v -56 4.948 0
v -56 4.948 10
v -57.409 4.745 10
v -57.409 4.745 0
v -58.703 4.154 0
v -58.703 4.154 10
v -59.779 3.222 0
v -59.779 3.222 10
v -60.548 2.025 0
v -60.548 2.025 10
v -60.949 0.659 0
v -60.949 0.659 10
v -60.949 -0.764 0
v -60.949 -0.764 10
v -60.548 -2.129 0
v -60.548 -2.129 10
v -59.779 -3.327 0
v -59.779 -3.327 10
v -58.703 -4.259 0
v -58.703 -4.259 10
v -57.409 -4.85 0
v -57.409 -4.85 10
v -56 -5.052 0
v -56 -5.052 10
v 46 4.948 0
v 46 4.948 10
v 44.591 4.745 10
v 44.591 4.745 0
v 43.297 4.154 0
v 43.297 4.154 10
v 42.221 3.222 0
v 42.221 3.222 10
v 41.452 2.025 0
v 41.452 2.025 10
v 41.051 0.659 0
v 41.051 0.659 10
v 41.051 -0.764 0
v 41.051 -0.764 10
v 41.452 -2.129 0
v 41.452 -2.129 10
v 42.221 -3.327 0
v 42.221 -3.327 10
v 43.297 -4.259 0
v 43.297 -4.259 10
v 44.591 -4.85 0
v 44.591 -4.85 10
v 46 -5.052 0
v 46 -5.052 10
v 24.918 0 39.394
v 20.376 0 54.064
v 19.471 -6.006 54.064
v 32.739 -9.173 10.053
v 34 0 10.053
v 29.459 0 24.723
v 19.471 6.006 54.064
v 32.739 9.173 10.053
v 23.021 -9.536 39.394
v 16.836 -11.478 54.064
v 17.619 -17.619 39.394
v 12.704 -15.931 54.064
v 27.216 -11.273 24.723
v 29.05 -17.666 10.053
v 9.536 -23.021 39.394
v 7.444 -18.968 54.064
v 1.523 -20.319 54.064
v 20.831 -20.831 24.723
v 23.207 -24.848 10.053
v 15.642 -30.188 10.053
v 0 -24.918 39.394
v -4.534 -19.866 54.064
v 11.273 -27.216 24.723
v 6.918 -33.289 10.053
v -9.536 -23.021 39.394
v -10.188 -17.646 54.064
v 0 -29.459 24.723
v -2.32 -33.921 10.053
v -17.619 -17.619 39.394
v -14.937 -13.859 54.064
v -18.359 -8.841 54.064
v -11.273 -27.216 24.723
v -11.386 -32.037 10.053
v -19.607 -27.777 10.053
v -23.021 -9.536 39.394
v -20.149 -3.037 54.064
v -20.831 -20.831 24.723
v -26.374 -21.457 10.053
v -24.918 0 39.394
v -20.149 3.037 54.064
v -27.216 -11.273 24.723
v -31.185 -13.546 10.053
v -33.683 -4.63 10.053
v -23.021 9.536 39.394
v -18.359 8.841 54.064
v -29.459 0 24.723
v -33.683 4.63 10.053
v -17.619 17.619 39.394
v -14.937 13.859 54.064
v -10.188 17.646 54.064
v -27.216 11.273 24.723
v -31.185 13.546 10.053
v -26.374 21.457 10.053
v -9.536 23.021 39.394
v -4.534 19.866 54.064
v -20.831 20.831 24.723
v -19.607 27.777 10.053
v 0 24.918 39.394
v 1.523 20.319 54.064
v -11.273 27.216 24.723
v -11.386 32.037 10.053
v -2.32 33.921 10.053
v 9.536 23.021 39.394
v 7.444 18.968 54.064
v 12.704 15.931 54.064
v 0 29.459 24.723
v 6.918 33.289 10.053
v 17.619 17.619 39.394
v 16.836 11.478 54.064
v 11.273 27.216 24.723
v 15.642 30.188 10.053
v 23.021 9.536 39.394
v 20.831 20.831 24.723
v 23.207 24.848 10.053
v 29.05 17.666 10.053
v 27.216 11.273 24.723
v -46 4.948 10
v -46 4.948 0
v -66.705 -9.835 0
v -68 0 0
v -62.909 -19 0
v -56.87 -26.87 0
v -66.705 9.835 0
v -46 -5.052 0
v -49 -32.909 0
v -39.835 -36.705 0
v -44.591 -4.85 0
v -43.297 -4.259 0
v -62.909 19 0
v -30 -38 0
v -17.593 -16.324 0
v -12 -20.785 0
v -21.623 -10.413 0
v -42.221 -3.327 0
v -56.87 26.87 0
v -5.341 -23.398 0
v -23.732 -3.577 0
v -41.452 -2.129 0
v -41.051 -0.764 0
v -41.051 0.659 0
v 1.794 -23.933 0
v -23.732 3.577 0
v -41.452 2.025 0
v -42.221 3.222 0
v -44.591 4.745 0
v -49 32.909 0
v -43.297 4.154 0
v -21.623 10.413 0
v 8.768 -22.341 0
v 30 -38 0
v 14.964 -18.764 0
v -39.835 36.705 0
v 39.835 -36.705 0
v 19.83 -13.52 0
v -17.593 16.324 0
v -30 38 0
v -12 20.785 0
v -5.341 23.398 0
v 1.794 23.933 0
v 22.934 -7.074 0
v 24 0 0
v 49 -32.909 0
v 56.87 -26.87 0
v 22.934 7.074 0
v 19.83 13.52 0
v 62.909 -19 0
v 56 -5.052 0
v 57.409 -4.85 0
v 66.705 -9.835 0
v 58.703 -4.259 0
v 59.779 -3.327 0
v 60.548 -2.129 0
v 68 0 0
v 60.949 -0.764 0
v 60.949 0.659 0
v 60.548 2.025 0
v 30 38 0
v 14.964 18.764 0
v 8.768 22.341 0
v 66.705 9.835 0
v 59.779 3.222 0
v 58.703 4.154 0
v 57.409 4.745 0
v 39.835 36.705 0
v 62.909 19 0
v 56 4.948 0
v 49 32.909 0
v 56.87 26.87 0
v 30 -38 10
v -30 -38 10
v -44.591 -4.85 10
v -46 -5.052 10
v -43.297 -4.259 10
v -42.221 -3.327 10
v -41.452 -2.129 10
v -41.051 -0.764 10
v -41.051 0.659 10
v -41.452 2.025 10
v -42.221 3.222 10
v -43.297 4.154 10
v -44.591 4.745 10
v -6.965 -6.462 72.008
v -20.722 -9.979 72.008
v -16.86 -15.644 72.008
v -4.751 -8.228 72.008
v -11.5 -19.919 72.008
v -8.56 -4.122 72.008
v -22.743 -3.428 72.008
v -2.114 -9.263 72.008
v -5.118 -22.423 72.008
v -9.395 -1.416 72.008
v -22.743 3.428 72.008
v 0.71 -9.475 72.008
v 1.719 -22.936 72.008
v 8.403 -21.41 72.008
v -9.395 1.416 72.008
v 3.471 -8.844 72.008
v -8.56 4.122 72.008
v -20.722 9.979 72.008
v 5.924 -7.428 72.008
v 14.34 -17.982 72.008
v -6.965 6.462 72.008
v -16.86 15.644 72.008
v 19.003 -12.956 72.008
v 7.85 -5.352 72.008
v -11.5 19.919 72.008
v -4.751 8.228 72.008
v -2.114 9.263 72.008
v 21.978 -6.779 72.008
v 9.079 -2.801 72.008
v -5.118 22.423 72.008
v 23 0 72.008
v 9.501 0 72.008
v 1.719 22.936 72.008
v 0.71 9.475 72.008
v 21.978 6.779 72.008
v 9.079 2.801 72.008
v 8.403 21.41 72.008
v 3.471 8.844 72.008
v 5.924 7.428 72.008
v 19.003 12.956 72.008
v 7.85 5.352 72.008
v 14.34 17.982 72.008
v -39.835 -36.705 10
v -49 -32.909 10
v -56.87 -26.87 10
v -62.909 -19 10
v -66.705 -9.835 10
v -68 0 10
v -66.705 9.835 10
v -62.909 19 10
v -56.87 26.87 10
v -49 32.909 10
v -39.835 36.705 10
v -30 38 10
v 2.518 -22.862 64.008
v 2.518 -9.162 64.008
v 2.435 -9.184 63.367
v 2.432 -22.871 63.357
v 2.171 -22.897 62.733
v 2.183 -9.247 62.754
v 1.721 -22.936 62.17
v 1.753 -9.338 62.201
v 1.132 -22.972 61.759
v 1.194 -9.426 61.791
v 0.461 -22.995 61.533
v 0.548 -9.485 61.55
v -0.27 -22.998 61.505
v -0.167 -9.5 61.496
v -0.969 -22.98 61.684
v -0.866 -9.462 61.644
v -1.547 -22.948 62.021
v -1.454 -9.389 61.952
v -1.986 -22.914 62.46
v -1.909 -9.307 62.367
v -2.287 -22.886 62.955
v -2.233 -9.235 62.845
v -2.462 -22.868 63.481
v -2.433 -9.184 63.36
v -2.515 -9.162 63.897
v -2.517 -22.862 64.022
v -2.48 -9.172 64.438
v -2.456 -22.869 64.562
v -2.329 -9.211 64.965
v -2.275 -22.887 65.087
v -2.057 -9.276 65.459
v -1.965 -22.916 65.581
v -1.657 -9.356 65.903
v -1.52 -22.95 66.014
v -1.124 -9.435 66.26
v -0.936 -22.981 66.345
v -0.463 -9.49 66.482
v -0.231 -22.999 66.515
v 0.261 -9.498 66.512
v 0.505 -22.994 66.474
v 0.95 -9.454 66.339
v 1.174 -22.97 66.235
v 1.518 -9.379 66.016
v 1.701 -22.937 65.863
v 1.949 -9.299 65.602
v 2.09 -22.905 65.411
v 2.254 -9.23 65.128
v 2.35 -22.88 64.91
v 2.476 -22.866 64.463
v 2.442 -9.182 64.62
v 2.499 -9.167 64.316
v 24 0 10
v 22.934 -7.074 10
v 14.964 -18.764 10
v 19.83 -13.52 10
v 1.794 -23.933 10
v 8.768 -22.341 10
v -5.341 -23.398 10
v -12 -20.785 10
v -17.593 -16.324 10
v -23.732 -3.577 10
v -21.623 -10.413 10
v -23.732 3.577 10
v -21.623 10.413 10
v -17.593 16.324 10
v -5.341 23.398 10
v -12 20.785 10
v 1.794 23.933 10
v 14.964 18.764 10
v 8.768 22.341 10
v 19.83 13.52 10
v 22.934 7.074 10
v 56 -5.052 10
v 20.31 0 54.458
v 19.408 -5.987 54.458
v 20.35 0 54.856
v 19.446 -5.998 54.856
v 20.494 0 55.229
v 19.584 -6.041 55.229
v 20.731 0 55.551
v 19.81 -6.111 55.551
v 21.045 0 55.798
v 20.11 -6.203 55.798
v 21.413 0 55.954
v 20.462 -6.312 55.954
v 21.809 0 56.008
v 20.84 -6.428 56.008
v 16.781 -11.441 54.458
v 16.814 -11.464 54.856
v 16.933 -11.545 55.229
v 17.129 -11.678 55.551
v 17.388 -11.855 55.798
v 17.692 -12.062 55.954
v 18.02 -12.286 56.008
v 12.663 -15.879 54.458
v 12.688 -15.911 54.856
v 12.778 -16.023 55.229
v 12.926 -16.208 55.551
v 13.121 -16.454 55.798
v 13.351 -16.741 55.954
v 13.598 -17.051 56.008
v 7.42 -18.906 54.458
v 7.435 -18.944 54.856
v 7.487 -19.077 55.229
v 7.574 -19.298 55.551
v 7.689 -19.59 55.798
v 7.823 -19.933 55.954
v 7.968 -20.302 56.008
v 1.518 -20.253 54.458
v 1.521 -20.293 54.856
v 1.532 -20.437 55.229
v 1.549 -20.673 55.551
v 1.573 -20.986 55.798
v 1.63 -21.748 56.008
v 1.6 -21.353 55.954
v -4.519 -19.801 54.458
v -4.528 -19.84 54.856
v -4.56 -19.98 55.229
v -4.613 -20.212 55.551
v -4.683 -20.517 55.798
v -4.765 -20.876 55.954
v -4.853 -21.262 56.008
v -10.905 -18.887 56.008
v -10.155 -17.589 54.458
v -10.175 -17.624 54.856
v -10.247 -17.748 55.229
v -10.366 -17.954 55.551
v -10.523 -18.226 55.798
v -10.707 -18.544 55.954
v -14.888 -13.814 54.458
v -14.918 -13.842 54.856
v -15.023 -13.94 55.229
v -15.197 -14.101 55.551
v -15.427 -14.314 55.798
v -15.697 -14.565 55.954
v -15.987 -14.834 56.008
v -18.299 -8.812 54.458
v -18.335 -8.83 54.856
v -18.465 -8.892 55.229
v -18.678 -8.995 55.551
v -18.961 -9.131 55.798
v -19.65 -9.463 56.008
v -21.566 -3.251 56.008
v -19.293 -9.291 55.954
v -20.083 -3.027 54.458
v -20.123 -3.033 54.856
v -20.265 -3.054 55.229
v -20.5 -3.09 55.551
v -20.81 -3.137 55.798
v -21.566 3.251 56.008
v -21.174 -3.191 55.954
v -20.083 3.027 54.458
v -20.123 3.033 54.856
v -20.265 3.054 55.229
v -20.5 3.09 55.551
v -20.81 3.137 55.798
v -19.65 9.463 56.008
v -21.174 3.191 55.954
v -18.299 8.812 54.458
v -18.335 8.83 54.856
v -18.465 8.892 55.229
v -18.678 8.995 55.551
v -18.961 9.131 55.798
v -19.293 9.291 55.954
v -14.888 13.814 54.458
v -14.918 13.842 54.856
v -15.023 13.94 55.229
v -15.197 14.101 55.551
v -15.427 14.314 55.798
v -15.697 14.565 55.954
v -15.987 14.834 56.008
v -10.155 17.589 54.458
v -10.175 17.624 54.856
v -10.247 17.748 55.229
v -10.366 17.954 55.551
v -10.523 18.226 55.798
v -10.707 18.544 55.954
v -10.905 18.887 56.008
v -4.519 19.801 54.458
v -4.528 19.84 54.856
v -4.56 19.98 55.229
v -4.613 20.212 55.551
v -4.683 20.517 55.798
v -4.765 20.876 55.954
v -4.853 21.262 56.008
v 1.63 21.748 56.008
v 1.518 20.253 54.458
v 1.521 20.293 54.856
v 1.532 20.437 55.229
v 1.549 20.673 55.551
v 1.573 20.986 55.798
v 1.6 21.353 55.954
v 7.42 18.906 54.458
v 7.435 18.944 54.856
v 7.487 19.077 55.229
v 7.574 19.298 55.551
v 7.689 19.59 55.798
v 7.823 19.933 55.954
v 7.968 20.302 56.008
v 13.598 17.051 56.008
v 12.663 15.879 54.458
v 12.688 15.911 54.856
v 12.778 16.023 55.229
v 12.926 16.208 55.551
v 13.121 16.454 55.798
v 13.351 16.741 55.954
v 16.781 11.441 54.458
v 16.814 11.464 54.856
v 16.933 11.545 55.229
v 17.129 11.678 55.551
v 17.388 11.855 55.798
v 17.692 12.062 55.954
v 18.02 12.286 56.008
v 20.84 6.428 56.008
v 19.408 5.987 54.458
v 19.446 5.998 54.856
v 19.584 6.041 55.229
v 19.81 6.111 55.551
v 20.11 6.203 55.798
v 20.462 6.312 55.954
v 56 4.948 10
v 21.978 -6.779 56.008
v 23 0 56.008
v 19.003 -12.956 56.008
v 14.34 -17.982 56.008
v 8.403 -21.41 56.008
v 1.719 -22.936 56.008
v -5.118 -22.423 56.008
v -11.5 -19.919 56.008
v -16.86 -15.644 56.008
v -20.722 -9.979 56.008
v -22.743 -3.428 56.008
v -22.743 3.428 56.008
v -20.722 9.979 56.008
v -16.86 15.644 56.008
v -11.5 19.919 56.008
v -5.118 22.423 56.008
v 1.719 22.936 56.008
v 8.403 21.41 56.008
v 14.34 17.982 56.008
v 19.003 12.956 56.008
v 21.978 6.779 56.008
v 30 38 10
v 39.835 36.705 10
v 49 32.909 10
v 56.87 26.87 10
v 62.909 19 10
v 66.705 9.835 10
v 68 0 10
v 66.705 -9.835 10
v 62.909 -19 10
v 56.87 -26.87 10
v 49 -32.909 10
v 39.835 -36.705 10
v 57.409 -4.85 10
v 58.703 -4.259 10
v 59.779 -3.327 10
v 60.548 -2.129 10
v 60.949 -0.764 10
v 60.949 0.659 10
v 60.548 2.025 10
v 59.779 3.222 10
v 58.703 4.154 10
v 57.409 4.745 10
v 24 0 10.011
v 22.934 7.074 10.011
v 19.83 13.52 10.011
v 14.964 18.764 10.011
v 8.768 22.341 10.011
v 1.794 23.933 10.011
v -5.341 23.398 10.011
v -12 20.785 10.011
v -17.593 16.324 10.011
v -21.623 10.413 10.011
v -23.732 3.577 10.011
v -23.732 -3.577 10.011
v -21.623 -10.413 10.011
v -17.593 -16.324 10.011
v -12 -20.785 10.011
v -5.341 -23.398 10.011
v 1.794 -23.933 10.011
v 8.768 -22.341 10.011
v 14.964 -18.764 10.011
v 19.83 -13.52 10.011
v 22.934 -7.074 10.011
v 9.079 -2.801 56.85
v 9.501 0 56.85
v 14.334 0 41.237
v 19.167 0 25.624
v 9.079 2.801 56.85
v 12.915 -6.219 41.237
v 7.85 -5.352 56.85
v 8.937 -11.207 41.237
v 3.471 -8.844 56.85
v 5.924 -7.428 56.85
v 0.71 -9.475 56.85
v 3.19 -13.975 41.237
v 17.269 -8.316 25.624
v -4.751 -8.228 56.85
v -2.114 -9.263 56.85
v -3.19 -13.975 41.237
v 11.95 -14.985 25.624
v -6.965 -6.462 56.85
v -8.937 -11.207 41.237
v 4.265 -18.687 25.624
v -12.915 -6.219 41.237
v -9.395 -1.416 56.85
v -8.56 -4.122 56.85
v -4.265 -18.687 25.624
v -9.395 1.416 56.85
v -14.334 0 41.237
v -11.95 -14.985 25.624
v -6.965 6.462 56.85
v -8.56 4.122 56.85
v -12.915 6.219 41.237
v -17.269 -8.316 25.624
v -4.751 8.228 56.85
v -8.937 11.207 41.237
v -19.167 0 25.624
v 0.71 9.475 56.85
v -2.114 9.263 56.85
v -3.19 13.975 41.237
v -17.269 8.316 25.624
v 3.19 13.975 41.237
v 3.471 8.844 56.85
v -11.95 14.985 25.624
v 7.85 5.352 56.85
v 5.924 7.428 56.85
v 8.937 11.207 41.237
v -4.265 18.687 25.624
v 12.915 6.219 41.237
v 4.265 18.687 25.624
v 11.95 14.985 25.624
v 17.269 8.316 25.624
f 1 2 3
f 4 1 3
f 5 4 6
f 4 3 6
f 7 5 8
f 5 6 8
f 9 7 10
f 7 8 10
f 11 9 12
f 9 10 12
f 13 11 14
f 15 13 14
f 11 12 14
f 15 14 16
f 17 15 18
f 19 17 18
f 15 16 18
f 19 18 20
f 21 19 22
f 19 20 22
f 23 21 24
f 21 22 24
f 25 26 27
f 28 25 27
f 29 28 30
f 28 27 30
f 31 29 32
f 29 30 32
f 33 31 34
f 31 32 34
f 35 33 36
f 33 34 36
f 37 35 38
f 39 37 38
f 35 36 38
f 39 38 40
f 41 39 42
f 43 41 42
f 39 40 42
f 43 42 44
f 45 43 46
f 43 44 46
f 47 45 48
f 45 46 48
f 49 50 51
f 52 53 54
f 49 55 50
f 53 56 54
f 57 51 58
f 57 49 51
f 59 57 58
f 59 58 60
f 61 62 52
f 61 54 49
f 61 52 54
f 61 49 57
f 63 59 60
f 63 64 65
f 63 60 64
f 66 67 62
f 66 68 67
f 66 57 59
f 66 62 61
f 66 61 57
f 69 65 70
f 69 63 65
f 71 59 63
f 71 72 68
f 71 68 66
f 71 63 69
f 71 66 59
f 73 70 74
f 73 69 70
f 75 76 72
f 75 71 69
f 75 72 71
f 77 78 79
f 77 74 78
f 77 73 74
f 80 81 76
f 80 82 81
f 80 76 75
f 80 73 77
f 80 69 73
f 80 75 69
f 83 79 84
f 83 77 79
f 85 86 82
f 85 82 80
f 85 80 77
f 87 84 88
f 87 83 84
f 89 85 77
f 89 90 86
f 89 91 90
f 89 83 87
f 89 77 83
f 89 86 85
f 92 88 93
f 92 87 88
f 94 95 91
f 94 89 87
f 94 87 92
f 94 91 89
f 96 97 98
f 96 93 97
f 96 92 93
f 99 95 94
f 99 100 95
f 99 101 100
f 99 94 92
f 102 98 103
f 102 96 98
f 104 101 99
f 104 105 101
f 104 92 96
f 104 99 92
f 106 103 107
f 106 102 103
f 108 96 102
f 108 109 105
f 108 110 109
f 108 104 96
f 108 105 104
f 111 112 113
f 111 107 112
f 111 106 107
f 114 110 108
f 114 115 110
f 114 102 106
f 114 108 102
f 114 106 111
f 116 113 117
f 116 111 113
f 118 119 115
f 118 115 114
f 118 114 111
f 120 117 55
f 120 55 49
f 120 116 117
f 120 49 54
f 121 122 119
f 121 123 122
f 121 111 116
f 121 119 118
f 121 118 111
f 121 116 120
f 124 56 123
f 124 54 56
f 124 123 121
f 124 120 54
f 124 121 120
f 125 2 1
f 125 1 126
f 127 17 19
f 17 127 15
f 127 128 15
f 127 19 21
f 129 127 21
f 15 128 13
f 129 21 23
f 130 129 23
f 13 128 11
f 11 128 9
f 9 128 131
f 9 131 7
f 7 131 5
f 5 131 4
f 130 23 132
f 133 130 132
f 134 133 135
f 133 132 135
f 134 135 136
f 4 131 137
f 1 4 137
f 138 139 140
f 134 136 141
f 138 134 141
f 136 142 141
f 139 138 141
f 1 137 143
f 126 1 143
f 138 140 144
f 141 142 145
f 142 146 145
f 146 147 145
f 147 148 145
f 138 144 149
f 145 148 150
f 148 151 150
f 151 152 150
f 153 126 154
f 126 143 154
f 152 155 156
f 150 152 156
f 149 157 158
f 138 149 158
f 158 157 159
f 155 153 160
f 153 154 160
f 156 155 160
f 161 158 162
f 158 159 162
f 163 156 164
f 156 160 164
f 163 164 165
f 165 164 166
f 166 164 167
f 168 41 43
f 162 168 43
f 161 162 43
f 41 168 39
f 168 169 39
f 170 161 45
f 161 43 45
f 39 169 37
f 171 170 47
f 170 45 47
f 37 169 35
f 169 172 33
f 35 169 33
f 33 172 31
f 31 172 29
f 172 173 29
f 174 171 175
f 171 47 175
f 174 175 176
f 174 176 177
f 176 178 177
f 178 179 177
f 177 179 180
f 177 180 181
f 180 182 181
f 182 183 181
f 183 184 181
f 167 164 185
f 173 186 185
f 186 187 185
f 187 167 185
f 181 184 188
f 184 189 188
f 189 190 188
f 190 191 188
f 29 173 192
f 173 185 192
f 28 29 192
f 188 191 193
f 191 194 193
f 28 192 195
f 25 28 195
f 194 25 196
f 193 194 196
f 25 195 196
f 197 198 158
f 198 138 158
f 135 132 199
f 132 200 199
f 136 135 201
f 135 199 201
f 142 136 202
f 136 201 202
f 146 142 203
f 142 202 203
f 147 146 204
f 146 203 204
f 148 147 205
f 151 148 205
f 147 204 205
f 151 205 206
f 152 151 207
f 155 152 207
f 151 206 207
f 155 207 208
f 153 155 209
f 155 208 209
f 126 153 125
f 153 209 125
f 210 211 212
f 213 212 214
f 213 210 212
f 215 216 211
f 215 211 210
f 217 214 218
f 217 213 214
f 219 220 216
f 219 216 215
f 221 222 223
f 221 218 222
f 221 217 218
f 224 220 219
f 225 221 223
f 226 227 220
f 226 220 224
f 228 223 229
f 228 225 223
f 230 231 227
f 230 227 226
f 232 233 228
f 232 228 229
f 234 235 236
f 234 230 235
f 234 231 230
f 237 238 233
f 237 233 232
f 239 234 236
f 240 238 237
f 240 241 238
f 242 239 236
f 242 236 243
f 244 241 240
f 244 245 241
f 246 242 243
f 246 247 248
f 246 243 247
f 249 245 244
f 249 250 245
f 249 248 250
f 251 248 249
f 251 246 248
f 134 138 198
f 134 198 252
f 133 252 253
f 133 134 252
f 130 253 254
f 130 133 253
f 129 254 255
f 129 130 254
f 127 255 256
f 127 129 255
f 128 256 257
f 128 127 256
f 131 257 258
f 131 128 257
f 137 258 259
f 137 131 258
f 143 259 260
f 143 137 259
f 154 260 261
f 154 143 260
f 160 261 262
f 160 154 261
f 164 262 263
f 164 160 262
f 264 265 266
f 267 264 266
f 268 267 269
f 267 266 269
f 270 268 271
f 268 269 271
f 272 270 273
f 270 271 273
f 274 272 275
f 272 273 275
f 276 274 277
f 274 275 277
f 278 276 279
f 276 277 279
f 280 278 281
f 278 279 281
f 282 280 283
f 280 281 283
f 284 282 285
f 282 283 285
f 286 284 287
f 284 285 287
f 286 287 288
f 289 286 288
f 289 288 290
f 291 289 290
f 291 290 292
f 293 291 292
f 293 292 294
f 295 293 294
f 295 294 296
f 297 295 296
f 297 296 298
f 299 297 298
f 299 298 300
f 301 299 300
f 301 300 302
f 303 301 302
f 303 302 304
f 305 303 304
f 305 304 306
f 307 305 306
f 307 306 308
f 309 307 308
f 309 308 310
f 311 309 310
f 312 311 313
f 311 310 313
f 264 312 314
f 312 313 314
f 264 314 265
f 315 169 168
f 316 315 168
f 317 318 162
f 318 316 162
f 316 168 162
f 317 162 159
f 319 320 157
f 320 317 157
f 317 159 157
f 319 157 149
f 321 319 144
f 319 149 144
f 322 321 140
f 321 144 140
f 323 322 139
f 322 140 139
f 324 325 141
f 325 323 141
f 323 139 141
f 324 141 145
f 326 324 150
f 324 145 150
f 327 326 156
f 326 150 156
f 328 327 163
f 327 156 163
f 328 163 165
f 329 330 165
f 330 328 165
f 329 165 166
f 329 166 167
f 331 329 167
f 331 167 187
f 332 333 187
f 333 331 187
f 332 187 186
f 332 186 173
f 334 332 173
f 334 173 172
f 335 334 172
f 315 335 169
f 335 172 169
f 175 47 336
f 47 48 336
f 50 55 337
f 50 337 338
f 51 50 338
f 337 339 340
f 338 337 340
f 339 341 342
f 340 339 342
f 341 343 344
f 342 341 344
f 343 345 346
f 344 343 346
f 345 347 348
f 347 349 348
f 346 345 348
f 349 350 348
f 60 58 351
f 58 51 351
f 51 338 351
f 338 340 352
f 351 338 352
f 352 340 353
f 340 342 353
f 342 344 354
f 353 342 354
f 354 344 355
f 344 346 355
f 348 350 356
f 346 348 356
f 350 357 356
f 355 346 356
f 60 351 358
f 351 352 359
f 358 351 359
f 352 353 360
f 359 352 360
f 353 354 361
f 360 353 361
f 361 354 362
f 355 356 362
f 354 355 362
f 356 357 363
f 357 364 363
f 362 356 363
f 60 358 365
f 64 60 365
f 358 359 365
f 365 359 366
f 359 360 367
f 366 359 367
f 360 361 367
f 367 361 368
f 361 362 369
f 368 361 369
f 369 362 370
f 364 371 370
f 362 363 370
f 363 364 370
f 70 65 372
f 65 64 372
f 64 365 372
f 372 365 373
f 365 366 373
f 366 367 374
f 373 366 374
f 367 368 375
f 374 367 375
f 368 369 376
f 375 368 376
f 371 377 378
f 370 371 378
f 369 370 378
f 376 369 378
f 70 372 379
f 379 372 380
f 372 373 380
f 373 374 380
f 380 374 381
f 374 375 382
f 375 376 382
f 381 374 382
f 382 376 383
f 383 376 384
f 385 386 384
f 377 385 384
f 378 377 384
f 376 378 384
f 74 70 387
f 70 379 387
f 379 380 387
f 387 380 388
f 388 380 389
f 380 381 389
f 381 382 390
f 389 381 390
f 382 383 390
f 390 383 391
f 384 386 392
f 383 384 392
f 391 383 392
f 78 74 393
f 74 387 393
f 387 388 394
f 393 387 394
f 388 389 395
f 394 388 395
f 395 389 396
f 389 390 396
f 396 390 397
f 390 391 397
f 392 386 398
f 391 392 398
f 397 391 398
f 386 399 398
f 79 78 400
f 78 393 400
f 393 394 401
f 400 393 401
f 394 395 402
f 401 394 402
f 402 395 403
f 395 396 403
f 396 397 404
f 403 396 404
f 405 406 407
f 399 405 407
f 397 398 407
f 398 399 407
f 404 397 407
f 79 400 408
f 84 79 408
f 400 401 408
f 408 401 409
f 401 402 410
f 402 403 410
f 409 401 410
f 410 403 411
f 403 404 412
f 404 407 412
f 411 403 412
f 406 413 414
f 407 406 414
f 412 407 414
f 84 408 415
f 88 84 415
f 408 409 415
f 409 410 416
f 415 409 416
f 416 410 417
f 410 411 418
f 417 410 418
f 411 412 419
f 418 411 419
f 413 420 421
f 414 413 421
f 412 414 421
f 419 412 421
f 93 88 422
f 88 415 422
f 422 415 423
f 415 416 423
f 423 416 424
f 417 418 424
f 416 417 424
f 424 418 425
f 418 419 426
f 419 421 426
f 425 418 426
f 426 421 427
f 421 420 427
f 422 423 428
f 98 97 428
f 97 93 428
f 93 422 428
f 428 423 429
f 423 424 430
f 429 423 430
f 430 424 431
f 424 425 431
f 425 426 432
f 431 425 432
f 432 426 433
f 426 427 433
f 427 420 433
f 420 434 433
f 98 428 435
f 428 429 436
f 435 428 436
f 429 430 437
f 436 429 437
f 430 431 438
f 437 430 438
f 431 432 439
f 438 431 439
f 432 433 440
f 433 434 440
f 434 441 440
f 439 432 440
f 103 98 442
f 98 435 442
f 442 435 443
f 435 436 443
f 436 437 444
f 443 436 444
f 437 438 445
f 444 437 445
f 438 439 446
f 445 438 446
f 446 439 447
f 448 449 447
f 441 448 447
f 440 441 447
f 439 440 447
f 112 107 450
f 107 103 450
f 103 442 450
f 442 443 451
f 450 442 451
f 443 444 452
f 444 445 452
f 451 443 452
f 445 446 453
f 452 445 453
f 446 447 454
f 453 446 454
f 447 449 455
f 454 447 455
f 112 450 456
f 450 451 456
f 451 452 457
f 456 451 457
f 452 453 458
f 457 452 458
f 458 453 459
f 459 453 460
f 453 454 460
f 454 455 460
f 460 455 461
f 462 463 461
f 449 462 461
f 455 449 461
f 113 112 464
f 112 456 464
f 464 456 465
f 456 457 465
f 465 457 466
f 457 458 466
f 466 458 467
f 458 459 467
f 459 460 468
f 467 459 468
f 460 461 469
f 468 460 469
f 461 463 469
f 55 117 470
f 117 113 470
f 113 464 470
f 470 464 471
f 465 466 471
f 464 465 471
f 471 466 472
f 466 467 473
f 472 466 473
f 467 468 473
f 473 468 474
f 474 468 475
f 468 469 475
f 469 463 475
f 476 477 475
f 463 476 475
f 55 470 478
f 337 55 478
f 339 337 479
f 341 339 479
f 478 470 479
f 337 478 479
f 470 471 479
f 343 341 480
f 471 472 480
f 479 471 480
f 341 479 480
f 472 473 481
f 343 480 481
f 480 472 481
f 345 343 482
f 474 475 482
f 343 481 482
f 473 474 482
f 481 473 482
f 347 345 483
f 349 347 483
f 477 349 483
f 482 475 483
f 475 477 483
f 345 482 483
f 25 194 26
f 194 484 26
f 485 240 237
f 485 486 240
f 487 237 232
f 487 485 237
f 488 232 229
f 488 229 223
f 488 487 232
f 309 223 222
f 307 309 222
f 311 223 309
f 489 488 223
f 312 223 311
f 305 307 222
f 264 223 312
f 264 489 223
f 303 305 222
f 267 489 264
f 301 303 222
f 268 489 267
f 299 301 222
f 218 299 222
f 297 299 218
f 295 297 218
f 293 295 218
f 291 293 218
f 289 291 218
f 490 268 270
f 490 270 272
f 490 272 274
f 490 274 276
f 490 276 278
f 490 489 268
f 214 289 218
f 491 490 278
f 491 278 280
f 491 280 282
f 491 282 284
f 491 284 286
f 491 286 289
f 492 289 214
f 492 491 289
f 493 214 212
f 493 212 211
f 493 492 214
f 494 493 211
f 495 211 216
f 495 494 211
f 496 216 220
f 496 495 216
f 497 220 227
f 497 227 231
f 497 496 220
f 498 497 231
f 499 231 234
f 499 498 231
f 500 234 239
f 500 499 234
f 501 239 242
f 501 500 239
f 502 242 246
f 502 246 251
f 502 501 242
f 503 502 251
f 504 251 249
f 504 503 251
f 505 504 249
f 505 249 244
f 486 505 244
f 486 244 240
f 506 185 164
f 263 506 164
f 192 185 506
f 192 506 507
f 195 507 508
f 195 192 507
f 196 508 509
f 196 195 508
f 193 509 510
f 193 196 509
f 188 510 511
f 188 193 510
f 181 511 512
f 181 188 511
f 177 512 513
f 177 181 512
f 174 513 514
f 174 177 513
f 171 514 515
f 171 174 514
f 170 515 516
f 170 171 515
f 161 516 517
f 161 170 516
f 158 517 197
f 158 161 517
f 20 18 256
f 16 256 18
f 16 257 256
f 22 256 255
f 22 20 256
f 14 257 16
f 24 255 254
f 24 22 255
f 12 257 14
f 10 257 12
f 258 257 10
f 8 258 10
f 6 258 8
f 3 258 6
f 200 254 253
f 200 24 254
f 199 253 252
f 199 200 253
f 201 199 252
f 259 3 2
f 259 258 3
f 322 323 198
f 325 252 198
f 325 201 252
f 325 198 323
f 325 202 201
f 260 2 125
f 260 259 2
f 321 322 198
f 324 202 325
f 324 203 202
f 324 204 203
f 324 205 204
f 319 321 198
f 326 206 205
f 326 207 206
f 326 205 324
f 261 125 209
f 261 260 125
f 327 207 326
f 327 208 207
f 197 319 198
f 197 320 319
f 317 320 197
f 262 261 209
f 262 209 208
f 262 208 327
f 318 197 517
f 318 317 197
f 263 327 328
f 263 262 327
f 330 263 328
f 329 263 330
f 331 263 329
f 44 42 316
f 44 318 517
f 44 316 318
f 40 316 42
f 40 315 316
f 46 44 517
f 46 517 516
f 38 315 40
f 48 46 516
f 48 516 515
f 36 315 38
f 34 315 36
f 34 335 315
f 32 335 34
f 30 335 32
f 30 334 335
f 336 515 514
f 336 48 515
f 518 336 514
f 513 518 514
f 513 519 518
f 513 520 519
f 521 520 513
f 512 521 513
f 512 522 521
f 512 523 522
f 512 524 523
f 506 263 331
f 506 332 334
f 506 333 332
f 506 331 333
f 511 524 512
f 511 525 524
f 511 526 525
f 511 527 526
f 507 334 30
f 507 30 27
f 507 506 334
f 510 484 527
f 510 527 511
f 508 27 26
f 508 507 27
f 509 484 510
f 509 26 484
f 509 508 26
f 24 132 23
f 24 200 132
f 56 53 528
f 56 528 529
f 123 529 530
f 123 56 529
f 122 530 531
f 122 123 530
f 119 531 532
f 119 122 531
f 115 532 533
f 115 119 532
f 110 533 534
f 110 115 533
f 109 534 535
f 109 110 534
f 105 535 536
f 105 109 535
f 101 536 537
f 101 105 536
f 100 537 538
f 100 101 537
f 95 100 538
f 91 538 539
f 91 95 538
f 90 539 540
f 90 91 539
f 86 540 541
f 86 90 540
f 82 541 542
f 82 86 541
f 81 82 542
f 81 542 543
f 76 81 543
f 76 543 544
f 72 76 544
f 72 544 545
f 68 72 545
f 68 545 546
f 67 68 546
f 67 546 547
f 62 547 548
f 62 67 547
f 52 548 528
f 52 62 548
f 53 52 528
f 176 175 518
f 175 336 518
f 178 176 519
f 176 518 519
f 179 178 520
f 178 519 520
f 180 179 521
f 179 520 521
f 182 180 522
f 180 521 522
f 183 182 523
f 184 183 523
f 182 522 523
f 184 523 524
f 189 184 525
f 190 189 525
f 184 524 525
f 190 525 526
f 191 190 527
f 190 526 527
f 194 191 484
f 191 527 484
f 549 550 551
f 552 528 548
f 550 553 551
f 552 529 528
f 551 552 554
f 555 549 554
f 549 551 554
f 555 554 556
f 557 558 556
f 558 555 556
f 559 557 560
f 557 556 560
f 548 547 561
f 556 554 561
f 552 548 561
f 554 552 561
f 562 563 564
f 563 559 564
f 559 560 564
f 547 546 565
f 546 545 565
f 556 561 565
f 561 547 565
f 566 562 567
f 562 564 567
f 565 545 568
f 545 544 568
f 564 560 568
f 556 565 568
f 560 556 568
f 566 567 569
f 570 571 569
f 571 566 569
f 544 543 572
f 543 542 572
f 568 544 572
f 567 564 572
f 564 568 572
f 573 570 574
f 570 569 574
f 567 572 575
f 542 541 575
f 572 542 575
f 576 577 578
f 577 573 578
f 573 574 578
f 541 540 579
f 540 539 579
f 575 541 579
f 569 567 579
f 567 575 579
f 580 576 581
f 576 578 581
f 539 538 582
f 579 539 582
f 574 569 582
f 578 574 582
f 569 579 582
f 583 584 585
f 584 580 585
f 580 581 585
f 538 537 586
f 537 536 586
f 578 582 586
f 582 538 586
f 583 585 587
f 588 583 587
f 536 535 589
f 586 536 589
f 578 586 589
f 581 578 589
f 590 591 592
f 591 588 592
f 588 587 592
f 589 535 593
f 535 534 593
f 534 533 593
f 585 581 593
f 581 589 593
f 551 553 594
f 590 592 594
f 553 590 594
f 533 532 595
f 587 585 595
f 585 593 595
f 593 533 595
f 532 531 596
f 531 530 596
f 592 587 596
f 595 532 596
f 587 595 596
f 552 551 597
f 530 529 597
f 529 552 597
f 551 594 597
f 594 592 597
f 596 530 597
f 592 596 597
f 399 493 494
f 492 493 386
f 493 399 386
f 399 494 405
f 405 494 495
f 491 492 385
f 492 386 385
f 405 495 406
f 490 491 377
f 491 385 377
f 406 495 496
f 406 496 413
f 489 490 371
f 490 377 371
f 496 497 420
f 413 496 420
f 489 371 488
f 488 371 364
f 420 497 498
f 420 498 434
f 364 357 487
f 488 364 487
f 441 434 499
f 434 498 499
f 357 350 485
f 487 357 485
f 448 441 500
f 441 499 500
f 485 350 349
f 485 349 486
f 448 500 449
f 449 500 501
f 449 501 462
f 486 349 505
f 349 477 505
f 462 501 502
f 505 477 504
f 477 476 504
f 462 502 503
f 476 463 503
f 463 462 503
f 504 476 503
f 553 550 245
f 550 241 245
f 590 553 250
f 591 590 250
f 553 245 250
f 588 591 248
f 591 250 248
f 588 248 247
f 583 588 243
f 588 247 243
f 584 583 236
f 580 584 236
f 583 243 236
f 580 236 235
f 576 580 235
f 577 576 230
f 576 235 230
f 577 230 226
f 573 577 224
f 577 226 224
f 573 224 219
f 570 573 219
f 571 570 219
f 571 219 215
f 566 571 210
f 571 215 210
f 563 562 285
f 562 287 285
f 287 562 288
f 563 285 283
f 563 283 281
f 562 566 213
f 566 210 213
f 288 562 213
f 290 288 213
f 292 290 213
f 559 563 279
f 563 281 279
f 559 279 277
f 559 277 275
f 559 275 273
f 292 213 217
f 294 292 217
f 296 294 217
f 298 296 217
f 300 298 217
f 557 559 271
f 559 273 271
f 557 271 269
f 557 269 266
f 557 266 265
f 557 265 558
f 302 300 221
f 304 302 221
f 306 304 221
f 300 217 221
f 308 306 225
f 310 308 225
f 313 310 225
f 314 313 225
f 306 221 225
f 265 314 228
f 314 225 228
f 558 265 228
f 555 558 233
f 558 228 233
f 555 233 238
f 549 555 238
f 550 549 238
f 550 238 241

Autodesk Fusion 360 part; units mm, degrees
sketch "Sketch1" plane through (0, 0, 0) normal (0, 0, 1) x (1, 0, 0)
  circle A0 centre (0, 0) radius 24
  line L0 (30, 38) -> (-30, 38)
  arc A1 (-30, 38) -> (-30, -38) centre (-30, 0) ccw
  line L1 (-30, -38) -> (30, -38)
  arc A2 (30, -38) -> (30, 38) centre (30, 0) ccw
  line L2 (30, 0) -> (-30, 0) construction
  dimension "d1" = 48
  dimension "d2" = 60
  dimension "d3" = 38
extrude "Extrude1" add sketch "Sketch1" along normal blind 10 makes body 1
sketch "Sketch2" plane through (0, 0, 0) normal (0, 1, 0) x (1, 0, 0)
  line L0 (0, 0) -> (0, -78.5429) construction
  line L1 (24, -10.0113) -> (11, -52.0077)
  line L2 (11, -52.0077) -> (11, -72.0077)
  line L3 (11, -72.0077) -> (23, -72.0077)
  line L4 (23, -72.0077) -> (23, -56.0077)
  line L5 (23, -56.0077) -> (21.8093, -56.0077)
  line L6 (20.3764, -54.0641) -> (34, -10.0531)
  line L7 (34, -10.0531) -> (24, -10.0113)
  arc A0 (20.3764, -54.0641) -> (21.8093, -56.0077) centre (21.8093, -54.5077) ccw
  dimension "d6" = 20
  dimension "d7" = 16
  dimension "d8" = 22
  dimension "d9" = 46
  dimension "d10" = 24
  dimension "d11" = 10
  dimension "d13" = 62
  dimension "d14" = 1.5
revolve "Revolve1" add sketch "Sketch2" angle 360 about axis through (0, 0, 0) along (0, 0, 1) separate body makes body 2
sketch "Sketch3" plane through (0, 0, 10) normal (0, 0, 1) x (-1, 0, 0)
  circle A0 centre (0, 0) radius 24
  arc A1 (-30, 38) -> (-30, -38) centre (-30, 0) ccw
  line L0 (-30, -38) -> (30, -38)
  arc A2 (30, -38) -> (30, 38) centre (30, 0) ccw
  line L1 (30, 38) -> (-30, 38)
  line L2 (0, 0) -> (0, 62.4779) construction
  line L3 (-46, 5.0523) -> (-56, 5.0523)
  arc A3 (-56, 5.0523) -> (-56, -4.9477) centre (-56, 0.0523) ccw
  line L4 (-56, -4.9477) -> (-46, -4.9477)
  arc A4 (-46, -4.9477) -> (-46, 5.0523) centre (-46, 0.0523) ccw
  line L5 (-46, 0.0523) -> (-56, 0.0523) construction
  line L6 (56, -4.9477) -> (46, -4.9477)
  arc A5 (46, 5.0523) -> (46, -4.9477) centre (46, 0.0523) ccw
  line L7 (46, 5.0523) -> (56, 5.0523)
  arc A6 (56, -4.9477) -> (56, 5.0523) centre (56, 0.0523) ccw
  point P0 (-51, 0.0523)
  dimension "d16" = 51
  dimension "d17" = 10
  dimension "d18" = 5
extrude "Extrude2" cut sketch "Sketch3" against normal blind 115 contours L3 A3 L4 A4 | L6 A5 L7 A6 bodies 1
sketch "Sketch4" plane through (0, 0, 0) normal (0, 1, 0) x (1, 0, 0)
  circle A0 centre (0, -64.0077) radius 3
  point P0 (23, -72.0077)
  dimension "d21" = 6
  dimension "d22" = 8
extrude "Extrude3" cut sketch "Sketch4" against normal blind 35 bodies 2
thread "Thread1" "ISO Metric profile 22.0 M22x3 M22x3 6H" major diameter 22.3386 minor diameter 19.0024 pitch 3 angle 60 resizes the face on face at (10.9453, -1.0952, 65.341) on bodies 2
thread "Thread2" "ISO Metric profile 6.0 M6x1 M6x1 6H" major diameter 6.147 minor diameter 5.035 pitch 1 angle 60 resizes the face on face at (2.9871, -18.2116, 63.7295) on bodies 2
